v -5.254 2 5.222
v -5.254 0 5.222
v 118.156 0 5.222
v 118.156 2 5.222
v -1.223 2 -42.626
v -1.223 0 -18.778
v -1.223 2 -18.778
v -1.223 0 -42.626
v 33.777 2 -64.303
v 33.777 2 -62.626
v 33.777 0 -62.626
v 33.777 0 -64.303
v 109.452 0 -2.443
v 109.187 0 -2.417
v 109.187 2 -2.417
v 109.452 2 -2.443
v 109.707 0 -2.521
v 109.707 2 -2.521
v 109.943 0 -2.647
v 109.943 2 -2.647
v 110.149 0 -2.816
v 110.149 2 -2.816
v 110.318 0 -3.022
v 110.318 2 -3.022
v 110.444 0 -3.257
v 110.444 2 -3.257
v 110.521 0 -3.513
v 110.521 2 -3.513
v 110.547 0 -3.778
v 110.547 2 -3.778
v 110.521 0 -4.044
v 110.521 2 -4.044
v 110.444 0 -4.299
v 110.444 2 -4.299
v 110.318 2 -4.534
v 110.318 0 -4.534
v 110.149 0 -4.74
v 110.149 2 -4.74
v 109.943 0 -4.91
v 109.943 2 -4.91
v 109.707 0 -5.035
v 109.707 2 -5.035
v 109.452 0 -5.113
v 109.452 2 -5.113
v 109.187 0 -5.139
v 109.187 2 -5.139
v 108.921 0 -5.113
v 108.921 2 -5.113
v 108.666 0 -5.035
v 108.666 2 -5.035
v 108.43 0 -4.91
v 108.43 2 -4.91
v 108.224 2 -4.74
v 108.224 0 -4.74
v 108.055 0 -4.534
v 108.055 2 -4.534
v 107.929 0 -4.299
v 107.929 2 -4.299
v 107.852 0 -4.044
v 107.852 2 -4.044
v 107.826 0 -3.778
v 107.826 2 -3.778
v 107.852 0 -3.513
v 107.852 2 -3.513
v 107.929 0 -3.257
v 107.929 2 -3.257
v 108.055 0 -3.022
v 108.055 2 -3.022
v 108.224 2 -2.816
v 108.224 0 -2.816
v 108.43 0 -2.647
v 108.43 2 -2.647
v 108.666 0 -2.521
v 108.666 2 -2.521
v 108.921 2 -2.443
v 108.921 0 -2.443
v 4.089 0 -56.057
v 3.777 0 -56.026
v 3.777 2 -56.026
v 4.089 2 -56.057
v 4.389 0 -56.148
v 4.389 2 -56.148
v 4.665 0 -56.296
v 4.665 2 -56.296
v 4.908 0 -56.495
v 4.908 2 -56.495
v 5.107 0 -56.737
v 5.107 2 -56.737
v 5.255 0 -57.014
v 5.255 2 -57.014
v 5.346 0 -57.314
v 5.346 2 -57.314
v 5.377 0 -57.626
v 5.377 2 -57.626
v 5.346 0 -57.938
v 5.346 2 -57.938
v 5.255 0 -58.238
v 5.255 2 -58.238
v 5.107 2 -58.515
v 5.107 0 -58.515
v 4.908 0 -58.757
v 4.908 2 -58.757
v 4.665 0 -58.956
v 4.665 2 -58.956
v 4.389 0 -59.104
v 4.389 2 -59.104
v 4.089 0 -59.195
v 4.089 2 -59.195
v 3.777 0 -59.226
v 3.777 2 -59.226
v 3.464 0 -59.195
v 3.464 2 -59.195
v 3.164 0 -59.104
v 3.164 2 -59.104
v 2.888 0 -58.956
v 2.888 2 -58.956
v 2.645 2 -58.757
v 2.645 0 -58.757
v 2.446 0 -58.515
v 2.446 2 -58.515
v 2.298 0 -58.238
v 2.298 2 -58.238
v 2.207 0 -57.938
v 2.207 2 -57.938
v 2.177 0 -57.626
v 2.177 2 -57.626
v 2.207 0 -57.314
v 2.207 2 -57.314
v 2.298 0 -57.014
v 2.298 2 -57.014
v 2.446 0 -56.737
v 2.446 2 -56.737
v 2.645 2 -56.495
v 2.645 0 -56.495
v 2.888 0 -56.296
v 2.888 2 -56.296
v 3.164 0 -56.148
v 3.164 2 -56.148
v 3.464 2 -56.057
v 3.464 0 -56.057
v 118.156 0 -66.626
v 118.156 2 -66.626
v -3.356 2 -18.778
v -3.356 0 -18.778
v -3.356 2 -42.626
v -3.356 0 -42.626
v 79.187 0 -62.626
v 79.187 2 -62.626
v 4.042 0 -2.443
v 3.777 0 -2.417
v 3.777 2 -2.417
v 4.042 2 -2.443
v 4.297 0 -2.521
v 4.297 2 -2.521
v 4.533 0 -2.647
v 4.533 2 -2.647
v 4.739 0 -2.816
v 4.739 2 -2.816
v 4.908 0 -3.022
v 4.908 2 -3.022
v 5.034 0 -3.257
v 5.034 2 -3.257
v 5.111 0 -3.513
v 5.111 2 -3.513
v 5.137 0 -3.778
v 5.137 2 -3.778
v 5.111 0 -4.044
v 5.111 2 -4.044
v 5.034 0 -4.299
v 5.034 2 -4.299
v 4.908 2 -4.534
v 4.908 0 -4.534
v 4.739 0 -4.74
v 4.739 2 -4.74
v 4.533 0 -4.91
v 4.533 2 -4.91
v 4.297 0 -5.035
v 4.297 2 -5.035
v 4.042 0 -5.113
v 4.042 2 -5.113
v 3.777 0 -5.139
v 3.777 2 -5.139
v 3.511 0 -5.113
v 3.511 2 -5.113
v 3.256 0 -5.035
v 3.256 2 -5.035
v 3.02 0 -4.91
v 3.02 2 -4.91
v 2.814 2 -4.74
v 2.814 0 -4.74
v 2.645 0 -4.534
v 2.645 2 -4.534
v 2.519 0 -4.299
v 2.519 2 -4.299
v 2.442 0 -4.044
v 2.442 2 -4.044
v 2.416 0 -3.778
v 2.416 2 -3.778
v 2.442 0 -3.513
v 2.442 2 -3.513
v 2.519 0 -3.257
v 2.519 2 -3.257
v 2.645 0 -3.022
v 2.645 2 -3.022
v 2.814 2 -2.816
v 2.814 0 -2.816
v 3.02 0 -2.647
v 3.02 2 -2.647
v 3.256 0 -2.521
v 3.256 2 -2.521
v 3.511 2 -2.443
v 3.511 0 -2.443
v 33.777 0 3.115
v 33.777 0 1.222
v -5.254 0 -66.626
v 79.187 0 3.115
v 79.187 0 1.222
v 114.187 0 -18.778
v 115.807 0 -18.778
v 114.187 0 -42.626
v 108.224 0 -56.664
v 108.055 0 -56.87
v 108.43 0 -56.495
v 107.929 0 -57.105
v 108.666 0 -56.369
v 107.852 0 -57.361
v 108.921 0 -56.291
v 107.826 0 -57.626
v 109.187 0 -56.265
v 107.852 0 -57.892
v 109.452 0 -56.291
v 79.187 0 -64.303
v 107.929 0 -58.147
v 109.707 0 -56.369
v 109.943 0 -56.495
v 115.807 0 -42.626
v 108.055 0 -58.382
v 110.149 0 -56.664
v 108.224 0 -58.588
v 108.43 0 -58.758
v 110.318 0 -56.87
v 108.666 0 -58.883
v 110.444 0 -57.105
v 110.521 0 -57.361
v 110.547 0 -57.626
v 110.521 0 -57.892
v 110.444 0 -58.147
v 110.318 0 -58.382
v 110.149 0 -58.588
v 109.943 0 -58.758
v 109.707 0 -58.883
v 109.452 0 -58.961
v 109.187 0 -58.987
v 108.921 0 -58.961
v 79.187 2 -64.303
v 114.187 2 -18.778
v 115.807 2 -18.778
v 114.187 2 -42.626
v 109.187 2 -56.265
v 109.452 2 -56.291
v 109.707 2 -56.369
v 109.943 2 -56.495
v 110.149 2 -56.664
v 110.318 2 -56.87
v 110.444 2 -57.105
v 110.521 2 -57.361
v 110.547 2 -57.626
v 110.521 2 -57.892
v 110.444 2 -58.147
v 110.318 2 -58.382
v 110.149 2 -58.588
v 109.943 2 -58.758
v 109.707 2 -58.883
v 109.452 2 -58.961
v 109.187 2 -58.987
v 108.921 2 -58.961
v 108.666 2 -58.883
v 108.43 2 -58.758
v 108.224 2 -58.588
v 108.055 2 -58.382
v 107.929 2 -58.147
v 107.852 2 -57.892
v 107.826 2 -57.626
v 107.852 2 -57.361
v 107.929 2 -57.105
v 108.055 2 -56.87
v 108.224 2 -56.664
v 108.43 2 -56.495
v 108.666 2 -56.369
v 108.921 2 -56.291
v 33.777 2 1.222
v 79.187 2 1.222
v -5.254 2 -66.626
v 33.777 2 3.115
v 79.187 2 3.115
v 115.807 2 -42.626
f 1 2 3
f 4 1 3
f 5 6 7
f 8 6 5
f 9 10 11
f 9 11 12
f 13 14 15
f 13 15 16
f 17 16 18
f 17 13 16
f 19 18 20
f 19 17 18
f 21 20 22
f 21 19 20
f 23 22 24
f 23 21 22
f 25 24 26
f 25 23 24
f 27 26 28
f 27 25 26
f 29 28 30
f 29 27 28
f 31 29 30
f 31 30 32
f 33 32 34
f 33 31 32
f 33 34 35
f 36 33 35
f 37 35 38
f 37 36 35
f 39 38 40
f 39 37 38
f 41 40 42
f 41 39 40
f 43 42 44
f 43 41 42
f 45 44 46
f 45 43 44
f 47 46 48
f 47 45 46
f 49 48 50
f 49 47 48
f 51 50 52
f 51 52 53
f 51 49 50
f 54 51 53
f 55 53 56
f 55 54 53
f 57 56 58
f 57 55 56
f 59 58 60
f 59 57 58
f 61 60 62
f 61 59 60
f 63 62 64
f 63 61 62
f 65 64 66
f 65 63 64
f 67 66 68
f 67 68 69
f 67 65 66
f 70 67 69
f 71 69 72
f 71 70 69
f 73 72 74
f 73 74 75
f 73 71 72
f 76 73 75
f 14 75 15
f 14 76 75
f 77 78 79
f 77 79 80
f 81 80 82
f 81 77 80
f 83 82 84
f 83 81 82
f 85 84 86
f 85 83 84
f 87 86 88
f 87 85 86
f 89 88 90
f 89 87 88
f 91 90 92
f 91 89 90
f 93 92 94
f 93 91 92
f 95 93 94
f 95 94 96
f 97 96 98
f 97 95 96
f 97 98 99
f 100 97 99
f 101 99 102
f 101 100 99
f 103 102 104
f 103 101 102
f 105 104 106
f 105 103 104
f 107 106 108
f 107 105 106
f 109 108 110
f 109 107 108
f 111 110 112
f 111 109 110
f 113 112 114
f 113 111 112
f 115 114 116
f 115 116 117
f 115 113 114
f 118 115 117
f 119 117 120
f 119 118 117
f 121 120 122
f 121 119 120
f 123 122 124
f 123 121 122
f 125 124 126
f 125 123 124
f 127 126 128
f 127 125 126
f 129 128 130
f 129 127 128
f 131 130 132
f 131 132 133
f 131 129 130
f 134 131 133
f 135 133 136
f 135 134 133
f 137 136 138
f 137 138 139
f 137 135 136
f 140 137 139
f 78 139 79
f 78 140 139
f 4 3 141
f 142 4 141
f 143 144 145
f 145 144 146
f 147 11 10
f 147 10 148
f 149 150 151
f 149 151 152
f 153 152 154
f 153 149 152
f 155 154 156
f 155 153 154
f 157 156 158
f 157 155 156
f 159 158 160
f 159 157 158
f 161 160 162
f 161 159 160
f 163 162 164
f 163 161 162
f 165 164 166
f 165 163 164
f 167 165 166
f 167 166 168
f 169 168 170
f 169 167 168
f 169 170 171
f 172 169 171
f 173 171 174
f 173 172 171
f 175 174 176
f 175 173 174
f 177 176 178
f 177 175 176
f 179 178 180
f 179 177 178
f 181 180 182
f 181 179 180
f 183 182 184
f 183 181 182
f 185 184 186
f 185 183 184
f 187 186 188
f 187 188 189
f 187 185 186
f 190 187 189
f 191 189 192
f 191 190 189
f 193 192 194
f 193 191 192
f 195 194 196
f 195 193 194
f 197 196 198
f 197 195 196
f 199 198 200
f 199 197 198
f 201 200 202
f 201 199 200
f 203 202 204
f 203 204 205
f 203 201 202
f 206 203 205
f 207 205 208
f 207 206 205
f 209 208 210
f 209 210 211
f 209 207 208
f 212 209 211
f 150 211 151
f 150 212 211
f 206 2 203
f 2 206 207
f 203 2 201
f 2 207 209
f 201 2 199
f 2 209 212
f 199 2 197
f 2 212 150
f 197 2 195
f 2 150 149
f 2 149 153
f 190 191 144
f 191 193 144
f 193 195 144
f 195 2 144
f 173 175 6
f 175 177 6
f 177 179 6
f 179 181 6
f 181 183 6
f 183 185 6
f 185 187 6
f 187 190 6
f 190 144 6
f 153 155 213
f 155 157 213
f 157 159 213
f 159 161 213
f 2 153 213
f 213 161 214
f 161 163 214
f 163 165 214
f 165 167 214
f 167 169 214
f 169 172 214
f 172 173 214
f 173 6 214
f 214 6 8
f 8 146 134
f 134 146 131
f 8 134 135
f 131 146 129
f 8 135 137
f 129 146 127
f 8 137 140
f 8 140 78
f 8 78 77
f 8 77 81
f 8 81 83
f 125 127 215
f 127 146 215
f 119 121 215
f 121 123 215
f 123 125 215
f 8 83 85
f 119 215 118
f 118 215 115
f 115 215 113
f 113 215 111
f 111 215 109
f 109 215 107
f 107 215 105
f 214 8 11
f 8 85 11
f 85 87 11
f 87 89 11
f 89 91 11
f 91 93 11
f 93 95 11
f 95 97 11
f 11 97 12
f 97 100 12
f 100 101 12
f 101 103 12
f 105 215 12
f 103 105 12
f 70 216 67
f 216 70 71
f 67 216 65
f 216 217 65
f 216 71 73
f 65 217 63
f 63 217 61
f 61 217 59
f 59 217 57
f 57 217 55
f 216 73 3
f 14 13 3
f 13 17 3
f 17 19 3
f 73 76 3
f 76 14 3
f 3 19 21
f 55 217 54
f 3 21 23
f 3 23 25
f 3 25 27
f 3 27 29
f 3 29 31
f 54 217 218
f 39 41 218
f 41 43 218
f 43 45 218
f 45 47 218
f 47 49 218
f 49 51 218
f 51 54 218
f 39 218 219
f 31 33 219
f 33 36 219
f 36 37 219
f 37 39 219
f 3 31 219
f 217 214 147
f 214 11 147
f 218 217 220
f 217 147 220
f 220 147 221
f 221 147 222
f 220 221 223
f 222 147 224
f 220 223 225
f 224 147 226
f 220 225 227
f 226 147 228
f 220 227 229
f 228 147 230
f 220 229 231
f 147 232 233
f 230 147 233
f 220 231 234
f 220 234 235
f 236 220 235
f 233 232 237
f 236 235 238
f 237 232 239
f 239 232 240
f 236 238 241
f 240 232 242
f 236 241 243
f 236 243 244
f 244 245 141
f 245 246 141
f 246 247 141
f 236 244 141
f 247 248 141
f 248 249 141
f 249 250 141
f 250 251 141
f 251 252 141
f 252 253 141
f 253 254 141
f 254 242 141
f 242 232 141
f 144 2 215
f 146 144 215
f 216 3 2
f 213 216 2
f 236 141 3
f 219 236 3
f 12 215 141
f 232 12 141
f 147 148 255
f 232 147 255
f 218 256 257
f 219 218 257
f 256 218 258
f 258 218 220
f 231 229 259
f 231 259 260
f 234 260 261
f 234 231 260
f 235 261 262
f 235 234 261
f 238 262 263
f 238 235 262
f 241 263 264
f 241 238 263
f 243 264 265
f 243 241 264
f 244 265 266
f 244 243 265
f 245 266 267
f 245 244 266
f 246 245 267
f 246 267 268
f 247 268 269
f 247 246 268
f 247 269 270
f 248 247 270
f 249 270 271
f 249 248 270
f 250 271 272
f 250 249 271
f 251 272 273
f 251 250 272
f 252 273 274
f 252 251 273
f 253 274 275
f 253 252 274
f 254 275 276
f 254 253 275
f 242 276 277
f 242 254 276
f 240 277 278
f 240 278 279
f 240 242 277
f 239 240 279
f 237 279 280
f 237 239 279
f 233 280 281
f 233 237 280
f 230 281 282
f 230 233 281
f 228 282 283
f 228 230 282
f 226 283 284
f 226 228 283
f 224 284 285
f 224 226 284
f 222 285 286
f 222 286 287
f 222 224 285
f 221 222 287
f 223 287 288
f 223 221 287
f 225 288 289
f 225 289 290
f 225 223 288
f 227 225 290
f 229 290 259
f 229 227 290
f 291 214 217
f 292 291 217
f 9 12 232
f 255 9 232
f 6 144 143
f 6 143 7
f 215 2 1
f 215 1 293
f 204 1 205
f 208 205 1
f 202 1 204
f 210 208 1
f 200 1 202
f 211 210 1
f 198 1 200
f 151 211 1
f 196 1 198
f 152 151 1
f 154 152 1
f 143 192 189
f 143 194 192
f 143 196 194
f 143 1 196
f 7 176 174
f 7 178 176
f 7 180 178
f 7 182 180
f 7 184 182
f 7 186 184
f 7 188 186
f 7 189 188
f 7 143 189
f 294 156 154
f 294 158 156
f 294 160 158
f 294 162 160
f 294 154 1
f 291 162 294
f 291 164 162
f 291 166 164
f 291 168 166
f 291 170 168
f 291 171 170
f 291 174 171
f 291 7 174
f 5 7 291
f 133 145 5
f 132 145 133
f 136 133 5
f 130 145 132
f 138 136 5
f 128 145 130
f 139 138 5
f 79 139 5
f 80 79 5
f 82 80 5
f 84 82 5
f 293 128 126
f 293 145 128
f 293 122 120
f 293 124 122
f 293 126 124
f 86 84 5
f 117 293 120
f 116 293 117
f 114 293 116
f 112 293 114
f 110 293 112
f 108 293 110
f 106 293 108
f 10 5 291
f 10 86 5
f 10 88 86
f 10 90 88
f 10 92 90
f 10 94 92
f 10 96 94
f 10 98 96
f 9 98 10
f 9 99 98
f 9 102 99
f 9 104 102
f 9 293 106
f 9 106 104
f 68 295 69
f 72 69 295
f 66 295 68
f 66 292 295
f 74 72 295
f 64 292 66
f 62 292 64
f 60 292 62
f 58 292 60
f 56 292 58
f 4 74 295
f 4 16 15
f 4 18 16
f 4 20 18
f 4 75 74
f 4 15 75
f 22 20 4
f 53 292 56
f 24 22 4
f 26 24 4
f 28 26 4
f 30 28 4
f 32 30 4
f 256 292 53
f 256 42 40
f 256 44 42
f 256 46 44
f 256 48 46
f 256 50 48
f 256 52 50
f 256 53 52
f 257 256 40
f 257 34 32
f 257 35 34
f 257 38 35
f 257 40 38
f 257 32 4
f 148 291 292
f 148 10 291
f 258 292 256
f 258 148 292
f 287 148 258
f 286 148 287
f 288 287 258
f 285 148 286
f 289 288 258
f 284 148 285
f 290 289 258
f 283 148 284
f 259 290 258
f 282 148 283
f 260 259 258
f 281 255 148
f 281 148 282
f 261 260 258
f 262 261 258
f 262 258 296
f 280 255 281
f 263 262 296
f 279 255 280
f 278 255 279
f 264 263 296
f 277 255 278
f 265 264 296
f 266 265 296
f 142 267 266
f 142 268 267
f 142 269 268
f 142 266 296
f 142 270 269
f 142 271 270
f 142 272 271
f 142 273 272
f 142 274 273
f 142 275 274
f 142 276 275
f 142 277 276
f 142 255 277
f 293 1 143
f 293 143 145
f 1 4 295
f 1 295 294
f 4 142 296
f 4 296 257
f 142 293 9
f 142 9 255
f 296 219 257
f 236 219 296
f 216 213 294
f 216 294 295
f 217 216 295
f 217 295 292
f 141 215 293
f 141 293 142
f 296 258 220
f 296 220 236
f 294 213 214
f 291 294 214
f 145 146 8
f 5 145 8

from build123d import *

# Parameters (mm, degrees)
SKETCH2_W           = 123.41
SKETCH2_H           = 71.848
SKETCH2_R           = 1.360904611
SKETCH2_R_2         = 1.6
SKETCH2_W_2         = 2.132357215
SKETCH2_H_2         = 23.848
SKETCH2_W_3         = 45.41
SKETCH2_H_3         = 1.677202247
SKETCH2_W_4         = 1.620785214
SKETCH2_H_4         = 1.892776038
BOSS_EXTRUDE1_DEPTH = 2


with BuildPart() as part:
    # Sketch2 → Boss-Extrude1 (new body)
    with BuildSketch(Plane(origin=(0, 0, 0), x_dir=(1, 0, 0), z_dir=(0, 1, 0))):
        with Locations((56.450952339, 30.702122774)):
            Rectangle(SKETCH2_W, SKETCH2_H)
        with Locations(Location((3.77654317, 3.778122774, 0), (0, 0, 270))):
            Circle(SKETCH2_R, mode=Mode.SUBTRACT)
        with Locations(Location((109.18654317, 3.778122774, 0), (0, 0, 270))):
            Circle(SKETCH2_R, mode=Mode.SUBTRACT)
        with Locations(Location((3.77654317, 57.626122774, 0), (0, 0, 270))):
            Circle(SKETCH2_R_2, mode=Mode.SUBTRACT)
        with Locations(Location((109.18654317, 57.626122774, 0), (0, 0, 270))):
            Circle(SKETCH2_R, mode=Mode.SUBTRACT)
        with Locations((-2.289635438, 30.702122774)):
            Rectangle(SKETCH2_W_2, SKETCH2_H_2, mode=Mode.SUBTRACT)
        with Locations((56.48154317, 63.464723898)):
            Rectangle(SKETCH2_W_3, SKETCH2_H_3, mode=Mode.SUBTRACT)
        with Locations((114.996935777, 30.702122774)):
            Rectangle(SKETCH2_W_4, SKETCH2_H_2, mode=Mode.SUBTRACT)
        with Locations((56.48154317, -2.168265245)):
            Rectangle(SKETCH2_W_3, SKETCH2_H_4, mode=Mode.SUBTRACT)
    extrude(amount=BOSS_EXTRUDE1_DEPTH)


solid = part.part
